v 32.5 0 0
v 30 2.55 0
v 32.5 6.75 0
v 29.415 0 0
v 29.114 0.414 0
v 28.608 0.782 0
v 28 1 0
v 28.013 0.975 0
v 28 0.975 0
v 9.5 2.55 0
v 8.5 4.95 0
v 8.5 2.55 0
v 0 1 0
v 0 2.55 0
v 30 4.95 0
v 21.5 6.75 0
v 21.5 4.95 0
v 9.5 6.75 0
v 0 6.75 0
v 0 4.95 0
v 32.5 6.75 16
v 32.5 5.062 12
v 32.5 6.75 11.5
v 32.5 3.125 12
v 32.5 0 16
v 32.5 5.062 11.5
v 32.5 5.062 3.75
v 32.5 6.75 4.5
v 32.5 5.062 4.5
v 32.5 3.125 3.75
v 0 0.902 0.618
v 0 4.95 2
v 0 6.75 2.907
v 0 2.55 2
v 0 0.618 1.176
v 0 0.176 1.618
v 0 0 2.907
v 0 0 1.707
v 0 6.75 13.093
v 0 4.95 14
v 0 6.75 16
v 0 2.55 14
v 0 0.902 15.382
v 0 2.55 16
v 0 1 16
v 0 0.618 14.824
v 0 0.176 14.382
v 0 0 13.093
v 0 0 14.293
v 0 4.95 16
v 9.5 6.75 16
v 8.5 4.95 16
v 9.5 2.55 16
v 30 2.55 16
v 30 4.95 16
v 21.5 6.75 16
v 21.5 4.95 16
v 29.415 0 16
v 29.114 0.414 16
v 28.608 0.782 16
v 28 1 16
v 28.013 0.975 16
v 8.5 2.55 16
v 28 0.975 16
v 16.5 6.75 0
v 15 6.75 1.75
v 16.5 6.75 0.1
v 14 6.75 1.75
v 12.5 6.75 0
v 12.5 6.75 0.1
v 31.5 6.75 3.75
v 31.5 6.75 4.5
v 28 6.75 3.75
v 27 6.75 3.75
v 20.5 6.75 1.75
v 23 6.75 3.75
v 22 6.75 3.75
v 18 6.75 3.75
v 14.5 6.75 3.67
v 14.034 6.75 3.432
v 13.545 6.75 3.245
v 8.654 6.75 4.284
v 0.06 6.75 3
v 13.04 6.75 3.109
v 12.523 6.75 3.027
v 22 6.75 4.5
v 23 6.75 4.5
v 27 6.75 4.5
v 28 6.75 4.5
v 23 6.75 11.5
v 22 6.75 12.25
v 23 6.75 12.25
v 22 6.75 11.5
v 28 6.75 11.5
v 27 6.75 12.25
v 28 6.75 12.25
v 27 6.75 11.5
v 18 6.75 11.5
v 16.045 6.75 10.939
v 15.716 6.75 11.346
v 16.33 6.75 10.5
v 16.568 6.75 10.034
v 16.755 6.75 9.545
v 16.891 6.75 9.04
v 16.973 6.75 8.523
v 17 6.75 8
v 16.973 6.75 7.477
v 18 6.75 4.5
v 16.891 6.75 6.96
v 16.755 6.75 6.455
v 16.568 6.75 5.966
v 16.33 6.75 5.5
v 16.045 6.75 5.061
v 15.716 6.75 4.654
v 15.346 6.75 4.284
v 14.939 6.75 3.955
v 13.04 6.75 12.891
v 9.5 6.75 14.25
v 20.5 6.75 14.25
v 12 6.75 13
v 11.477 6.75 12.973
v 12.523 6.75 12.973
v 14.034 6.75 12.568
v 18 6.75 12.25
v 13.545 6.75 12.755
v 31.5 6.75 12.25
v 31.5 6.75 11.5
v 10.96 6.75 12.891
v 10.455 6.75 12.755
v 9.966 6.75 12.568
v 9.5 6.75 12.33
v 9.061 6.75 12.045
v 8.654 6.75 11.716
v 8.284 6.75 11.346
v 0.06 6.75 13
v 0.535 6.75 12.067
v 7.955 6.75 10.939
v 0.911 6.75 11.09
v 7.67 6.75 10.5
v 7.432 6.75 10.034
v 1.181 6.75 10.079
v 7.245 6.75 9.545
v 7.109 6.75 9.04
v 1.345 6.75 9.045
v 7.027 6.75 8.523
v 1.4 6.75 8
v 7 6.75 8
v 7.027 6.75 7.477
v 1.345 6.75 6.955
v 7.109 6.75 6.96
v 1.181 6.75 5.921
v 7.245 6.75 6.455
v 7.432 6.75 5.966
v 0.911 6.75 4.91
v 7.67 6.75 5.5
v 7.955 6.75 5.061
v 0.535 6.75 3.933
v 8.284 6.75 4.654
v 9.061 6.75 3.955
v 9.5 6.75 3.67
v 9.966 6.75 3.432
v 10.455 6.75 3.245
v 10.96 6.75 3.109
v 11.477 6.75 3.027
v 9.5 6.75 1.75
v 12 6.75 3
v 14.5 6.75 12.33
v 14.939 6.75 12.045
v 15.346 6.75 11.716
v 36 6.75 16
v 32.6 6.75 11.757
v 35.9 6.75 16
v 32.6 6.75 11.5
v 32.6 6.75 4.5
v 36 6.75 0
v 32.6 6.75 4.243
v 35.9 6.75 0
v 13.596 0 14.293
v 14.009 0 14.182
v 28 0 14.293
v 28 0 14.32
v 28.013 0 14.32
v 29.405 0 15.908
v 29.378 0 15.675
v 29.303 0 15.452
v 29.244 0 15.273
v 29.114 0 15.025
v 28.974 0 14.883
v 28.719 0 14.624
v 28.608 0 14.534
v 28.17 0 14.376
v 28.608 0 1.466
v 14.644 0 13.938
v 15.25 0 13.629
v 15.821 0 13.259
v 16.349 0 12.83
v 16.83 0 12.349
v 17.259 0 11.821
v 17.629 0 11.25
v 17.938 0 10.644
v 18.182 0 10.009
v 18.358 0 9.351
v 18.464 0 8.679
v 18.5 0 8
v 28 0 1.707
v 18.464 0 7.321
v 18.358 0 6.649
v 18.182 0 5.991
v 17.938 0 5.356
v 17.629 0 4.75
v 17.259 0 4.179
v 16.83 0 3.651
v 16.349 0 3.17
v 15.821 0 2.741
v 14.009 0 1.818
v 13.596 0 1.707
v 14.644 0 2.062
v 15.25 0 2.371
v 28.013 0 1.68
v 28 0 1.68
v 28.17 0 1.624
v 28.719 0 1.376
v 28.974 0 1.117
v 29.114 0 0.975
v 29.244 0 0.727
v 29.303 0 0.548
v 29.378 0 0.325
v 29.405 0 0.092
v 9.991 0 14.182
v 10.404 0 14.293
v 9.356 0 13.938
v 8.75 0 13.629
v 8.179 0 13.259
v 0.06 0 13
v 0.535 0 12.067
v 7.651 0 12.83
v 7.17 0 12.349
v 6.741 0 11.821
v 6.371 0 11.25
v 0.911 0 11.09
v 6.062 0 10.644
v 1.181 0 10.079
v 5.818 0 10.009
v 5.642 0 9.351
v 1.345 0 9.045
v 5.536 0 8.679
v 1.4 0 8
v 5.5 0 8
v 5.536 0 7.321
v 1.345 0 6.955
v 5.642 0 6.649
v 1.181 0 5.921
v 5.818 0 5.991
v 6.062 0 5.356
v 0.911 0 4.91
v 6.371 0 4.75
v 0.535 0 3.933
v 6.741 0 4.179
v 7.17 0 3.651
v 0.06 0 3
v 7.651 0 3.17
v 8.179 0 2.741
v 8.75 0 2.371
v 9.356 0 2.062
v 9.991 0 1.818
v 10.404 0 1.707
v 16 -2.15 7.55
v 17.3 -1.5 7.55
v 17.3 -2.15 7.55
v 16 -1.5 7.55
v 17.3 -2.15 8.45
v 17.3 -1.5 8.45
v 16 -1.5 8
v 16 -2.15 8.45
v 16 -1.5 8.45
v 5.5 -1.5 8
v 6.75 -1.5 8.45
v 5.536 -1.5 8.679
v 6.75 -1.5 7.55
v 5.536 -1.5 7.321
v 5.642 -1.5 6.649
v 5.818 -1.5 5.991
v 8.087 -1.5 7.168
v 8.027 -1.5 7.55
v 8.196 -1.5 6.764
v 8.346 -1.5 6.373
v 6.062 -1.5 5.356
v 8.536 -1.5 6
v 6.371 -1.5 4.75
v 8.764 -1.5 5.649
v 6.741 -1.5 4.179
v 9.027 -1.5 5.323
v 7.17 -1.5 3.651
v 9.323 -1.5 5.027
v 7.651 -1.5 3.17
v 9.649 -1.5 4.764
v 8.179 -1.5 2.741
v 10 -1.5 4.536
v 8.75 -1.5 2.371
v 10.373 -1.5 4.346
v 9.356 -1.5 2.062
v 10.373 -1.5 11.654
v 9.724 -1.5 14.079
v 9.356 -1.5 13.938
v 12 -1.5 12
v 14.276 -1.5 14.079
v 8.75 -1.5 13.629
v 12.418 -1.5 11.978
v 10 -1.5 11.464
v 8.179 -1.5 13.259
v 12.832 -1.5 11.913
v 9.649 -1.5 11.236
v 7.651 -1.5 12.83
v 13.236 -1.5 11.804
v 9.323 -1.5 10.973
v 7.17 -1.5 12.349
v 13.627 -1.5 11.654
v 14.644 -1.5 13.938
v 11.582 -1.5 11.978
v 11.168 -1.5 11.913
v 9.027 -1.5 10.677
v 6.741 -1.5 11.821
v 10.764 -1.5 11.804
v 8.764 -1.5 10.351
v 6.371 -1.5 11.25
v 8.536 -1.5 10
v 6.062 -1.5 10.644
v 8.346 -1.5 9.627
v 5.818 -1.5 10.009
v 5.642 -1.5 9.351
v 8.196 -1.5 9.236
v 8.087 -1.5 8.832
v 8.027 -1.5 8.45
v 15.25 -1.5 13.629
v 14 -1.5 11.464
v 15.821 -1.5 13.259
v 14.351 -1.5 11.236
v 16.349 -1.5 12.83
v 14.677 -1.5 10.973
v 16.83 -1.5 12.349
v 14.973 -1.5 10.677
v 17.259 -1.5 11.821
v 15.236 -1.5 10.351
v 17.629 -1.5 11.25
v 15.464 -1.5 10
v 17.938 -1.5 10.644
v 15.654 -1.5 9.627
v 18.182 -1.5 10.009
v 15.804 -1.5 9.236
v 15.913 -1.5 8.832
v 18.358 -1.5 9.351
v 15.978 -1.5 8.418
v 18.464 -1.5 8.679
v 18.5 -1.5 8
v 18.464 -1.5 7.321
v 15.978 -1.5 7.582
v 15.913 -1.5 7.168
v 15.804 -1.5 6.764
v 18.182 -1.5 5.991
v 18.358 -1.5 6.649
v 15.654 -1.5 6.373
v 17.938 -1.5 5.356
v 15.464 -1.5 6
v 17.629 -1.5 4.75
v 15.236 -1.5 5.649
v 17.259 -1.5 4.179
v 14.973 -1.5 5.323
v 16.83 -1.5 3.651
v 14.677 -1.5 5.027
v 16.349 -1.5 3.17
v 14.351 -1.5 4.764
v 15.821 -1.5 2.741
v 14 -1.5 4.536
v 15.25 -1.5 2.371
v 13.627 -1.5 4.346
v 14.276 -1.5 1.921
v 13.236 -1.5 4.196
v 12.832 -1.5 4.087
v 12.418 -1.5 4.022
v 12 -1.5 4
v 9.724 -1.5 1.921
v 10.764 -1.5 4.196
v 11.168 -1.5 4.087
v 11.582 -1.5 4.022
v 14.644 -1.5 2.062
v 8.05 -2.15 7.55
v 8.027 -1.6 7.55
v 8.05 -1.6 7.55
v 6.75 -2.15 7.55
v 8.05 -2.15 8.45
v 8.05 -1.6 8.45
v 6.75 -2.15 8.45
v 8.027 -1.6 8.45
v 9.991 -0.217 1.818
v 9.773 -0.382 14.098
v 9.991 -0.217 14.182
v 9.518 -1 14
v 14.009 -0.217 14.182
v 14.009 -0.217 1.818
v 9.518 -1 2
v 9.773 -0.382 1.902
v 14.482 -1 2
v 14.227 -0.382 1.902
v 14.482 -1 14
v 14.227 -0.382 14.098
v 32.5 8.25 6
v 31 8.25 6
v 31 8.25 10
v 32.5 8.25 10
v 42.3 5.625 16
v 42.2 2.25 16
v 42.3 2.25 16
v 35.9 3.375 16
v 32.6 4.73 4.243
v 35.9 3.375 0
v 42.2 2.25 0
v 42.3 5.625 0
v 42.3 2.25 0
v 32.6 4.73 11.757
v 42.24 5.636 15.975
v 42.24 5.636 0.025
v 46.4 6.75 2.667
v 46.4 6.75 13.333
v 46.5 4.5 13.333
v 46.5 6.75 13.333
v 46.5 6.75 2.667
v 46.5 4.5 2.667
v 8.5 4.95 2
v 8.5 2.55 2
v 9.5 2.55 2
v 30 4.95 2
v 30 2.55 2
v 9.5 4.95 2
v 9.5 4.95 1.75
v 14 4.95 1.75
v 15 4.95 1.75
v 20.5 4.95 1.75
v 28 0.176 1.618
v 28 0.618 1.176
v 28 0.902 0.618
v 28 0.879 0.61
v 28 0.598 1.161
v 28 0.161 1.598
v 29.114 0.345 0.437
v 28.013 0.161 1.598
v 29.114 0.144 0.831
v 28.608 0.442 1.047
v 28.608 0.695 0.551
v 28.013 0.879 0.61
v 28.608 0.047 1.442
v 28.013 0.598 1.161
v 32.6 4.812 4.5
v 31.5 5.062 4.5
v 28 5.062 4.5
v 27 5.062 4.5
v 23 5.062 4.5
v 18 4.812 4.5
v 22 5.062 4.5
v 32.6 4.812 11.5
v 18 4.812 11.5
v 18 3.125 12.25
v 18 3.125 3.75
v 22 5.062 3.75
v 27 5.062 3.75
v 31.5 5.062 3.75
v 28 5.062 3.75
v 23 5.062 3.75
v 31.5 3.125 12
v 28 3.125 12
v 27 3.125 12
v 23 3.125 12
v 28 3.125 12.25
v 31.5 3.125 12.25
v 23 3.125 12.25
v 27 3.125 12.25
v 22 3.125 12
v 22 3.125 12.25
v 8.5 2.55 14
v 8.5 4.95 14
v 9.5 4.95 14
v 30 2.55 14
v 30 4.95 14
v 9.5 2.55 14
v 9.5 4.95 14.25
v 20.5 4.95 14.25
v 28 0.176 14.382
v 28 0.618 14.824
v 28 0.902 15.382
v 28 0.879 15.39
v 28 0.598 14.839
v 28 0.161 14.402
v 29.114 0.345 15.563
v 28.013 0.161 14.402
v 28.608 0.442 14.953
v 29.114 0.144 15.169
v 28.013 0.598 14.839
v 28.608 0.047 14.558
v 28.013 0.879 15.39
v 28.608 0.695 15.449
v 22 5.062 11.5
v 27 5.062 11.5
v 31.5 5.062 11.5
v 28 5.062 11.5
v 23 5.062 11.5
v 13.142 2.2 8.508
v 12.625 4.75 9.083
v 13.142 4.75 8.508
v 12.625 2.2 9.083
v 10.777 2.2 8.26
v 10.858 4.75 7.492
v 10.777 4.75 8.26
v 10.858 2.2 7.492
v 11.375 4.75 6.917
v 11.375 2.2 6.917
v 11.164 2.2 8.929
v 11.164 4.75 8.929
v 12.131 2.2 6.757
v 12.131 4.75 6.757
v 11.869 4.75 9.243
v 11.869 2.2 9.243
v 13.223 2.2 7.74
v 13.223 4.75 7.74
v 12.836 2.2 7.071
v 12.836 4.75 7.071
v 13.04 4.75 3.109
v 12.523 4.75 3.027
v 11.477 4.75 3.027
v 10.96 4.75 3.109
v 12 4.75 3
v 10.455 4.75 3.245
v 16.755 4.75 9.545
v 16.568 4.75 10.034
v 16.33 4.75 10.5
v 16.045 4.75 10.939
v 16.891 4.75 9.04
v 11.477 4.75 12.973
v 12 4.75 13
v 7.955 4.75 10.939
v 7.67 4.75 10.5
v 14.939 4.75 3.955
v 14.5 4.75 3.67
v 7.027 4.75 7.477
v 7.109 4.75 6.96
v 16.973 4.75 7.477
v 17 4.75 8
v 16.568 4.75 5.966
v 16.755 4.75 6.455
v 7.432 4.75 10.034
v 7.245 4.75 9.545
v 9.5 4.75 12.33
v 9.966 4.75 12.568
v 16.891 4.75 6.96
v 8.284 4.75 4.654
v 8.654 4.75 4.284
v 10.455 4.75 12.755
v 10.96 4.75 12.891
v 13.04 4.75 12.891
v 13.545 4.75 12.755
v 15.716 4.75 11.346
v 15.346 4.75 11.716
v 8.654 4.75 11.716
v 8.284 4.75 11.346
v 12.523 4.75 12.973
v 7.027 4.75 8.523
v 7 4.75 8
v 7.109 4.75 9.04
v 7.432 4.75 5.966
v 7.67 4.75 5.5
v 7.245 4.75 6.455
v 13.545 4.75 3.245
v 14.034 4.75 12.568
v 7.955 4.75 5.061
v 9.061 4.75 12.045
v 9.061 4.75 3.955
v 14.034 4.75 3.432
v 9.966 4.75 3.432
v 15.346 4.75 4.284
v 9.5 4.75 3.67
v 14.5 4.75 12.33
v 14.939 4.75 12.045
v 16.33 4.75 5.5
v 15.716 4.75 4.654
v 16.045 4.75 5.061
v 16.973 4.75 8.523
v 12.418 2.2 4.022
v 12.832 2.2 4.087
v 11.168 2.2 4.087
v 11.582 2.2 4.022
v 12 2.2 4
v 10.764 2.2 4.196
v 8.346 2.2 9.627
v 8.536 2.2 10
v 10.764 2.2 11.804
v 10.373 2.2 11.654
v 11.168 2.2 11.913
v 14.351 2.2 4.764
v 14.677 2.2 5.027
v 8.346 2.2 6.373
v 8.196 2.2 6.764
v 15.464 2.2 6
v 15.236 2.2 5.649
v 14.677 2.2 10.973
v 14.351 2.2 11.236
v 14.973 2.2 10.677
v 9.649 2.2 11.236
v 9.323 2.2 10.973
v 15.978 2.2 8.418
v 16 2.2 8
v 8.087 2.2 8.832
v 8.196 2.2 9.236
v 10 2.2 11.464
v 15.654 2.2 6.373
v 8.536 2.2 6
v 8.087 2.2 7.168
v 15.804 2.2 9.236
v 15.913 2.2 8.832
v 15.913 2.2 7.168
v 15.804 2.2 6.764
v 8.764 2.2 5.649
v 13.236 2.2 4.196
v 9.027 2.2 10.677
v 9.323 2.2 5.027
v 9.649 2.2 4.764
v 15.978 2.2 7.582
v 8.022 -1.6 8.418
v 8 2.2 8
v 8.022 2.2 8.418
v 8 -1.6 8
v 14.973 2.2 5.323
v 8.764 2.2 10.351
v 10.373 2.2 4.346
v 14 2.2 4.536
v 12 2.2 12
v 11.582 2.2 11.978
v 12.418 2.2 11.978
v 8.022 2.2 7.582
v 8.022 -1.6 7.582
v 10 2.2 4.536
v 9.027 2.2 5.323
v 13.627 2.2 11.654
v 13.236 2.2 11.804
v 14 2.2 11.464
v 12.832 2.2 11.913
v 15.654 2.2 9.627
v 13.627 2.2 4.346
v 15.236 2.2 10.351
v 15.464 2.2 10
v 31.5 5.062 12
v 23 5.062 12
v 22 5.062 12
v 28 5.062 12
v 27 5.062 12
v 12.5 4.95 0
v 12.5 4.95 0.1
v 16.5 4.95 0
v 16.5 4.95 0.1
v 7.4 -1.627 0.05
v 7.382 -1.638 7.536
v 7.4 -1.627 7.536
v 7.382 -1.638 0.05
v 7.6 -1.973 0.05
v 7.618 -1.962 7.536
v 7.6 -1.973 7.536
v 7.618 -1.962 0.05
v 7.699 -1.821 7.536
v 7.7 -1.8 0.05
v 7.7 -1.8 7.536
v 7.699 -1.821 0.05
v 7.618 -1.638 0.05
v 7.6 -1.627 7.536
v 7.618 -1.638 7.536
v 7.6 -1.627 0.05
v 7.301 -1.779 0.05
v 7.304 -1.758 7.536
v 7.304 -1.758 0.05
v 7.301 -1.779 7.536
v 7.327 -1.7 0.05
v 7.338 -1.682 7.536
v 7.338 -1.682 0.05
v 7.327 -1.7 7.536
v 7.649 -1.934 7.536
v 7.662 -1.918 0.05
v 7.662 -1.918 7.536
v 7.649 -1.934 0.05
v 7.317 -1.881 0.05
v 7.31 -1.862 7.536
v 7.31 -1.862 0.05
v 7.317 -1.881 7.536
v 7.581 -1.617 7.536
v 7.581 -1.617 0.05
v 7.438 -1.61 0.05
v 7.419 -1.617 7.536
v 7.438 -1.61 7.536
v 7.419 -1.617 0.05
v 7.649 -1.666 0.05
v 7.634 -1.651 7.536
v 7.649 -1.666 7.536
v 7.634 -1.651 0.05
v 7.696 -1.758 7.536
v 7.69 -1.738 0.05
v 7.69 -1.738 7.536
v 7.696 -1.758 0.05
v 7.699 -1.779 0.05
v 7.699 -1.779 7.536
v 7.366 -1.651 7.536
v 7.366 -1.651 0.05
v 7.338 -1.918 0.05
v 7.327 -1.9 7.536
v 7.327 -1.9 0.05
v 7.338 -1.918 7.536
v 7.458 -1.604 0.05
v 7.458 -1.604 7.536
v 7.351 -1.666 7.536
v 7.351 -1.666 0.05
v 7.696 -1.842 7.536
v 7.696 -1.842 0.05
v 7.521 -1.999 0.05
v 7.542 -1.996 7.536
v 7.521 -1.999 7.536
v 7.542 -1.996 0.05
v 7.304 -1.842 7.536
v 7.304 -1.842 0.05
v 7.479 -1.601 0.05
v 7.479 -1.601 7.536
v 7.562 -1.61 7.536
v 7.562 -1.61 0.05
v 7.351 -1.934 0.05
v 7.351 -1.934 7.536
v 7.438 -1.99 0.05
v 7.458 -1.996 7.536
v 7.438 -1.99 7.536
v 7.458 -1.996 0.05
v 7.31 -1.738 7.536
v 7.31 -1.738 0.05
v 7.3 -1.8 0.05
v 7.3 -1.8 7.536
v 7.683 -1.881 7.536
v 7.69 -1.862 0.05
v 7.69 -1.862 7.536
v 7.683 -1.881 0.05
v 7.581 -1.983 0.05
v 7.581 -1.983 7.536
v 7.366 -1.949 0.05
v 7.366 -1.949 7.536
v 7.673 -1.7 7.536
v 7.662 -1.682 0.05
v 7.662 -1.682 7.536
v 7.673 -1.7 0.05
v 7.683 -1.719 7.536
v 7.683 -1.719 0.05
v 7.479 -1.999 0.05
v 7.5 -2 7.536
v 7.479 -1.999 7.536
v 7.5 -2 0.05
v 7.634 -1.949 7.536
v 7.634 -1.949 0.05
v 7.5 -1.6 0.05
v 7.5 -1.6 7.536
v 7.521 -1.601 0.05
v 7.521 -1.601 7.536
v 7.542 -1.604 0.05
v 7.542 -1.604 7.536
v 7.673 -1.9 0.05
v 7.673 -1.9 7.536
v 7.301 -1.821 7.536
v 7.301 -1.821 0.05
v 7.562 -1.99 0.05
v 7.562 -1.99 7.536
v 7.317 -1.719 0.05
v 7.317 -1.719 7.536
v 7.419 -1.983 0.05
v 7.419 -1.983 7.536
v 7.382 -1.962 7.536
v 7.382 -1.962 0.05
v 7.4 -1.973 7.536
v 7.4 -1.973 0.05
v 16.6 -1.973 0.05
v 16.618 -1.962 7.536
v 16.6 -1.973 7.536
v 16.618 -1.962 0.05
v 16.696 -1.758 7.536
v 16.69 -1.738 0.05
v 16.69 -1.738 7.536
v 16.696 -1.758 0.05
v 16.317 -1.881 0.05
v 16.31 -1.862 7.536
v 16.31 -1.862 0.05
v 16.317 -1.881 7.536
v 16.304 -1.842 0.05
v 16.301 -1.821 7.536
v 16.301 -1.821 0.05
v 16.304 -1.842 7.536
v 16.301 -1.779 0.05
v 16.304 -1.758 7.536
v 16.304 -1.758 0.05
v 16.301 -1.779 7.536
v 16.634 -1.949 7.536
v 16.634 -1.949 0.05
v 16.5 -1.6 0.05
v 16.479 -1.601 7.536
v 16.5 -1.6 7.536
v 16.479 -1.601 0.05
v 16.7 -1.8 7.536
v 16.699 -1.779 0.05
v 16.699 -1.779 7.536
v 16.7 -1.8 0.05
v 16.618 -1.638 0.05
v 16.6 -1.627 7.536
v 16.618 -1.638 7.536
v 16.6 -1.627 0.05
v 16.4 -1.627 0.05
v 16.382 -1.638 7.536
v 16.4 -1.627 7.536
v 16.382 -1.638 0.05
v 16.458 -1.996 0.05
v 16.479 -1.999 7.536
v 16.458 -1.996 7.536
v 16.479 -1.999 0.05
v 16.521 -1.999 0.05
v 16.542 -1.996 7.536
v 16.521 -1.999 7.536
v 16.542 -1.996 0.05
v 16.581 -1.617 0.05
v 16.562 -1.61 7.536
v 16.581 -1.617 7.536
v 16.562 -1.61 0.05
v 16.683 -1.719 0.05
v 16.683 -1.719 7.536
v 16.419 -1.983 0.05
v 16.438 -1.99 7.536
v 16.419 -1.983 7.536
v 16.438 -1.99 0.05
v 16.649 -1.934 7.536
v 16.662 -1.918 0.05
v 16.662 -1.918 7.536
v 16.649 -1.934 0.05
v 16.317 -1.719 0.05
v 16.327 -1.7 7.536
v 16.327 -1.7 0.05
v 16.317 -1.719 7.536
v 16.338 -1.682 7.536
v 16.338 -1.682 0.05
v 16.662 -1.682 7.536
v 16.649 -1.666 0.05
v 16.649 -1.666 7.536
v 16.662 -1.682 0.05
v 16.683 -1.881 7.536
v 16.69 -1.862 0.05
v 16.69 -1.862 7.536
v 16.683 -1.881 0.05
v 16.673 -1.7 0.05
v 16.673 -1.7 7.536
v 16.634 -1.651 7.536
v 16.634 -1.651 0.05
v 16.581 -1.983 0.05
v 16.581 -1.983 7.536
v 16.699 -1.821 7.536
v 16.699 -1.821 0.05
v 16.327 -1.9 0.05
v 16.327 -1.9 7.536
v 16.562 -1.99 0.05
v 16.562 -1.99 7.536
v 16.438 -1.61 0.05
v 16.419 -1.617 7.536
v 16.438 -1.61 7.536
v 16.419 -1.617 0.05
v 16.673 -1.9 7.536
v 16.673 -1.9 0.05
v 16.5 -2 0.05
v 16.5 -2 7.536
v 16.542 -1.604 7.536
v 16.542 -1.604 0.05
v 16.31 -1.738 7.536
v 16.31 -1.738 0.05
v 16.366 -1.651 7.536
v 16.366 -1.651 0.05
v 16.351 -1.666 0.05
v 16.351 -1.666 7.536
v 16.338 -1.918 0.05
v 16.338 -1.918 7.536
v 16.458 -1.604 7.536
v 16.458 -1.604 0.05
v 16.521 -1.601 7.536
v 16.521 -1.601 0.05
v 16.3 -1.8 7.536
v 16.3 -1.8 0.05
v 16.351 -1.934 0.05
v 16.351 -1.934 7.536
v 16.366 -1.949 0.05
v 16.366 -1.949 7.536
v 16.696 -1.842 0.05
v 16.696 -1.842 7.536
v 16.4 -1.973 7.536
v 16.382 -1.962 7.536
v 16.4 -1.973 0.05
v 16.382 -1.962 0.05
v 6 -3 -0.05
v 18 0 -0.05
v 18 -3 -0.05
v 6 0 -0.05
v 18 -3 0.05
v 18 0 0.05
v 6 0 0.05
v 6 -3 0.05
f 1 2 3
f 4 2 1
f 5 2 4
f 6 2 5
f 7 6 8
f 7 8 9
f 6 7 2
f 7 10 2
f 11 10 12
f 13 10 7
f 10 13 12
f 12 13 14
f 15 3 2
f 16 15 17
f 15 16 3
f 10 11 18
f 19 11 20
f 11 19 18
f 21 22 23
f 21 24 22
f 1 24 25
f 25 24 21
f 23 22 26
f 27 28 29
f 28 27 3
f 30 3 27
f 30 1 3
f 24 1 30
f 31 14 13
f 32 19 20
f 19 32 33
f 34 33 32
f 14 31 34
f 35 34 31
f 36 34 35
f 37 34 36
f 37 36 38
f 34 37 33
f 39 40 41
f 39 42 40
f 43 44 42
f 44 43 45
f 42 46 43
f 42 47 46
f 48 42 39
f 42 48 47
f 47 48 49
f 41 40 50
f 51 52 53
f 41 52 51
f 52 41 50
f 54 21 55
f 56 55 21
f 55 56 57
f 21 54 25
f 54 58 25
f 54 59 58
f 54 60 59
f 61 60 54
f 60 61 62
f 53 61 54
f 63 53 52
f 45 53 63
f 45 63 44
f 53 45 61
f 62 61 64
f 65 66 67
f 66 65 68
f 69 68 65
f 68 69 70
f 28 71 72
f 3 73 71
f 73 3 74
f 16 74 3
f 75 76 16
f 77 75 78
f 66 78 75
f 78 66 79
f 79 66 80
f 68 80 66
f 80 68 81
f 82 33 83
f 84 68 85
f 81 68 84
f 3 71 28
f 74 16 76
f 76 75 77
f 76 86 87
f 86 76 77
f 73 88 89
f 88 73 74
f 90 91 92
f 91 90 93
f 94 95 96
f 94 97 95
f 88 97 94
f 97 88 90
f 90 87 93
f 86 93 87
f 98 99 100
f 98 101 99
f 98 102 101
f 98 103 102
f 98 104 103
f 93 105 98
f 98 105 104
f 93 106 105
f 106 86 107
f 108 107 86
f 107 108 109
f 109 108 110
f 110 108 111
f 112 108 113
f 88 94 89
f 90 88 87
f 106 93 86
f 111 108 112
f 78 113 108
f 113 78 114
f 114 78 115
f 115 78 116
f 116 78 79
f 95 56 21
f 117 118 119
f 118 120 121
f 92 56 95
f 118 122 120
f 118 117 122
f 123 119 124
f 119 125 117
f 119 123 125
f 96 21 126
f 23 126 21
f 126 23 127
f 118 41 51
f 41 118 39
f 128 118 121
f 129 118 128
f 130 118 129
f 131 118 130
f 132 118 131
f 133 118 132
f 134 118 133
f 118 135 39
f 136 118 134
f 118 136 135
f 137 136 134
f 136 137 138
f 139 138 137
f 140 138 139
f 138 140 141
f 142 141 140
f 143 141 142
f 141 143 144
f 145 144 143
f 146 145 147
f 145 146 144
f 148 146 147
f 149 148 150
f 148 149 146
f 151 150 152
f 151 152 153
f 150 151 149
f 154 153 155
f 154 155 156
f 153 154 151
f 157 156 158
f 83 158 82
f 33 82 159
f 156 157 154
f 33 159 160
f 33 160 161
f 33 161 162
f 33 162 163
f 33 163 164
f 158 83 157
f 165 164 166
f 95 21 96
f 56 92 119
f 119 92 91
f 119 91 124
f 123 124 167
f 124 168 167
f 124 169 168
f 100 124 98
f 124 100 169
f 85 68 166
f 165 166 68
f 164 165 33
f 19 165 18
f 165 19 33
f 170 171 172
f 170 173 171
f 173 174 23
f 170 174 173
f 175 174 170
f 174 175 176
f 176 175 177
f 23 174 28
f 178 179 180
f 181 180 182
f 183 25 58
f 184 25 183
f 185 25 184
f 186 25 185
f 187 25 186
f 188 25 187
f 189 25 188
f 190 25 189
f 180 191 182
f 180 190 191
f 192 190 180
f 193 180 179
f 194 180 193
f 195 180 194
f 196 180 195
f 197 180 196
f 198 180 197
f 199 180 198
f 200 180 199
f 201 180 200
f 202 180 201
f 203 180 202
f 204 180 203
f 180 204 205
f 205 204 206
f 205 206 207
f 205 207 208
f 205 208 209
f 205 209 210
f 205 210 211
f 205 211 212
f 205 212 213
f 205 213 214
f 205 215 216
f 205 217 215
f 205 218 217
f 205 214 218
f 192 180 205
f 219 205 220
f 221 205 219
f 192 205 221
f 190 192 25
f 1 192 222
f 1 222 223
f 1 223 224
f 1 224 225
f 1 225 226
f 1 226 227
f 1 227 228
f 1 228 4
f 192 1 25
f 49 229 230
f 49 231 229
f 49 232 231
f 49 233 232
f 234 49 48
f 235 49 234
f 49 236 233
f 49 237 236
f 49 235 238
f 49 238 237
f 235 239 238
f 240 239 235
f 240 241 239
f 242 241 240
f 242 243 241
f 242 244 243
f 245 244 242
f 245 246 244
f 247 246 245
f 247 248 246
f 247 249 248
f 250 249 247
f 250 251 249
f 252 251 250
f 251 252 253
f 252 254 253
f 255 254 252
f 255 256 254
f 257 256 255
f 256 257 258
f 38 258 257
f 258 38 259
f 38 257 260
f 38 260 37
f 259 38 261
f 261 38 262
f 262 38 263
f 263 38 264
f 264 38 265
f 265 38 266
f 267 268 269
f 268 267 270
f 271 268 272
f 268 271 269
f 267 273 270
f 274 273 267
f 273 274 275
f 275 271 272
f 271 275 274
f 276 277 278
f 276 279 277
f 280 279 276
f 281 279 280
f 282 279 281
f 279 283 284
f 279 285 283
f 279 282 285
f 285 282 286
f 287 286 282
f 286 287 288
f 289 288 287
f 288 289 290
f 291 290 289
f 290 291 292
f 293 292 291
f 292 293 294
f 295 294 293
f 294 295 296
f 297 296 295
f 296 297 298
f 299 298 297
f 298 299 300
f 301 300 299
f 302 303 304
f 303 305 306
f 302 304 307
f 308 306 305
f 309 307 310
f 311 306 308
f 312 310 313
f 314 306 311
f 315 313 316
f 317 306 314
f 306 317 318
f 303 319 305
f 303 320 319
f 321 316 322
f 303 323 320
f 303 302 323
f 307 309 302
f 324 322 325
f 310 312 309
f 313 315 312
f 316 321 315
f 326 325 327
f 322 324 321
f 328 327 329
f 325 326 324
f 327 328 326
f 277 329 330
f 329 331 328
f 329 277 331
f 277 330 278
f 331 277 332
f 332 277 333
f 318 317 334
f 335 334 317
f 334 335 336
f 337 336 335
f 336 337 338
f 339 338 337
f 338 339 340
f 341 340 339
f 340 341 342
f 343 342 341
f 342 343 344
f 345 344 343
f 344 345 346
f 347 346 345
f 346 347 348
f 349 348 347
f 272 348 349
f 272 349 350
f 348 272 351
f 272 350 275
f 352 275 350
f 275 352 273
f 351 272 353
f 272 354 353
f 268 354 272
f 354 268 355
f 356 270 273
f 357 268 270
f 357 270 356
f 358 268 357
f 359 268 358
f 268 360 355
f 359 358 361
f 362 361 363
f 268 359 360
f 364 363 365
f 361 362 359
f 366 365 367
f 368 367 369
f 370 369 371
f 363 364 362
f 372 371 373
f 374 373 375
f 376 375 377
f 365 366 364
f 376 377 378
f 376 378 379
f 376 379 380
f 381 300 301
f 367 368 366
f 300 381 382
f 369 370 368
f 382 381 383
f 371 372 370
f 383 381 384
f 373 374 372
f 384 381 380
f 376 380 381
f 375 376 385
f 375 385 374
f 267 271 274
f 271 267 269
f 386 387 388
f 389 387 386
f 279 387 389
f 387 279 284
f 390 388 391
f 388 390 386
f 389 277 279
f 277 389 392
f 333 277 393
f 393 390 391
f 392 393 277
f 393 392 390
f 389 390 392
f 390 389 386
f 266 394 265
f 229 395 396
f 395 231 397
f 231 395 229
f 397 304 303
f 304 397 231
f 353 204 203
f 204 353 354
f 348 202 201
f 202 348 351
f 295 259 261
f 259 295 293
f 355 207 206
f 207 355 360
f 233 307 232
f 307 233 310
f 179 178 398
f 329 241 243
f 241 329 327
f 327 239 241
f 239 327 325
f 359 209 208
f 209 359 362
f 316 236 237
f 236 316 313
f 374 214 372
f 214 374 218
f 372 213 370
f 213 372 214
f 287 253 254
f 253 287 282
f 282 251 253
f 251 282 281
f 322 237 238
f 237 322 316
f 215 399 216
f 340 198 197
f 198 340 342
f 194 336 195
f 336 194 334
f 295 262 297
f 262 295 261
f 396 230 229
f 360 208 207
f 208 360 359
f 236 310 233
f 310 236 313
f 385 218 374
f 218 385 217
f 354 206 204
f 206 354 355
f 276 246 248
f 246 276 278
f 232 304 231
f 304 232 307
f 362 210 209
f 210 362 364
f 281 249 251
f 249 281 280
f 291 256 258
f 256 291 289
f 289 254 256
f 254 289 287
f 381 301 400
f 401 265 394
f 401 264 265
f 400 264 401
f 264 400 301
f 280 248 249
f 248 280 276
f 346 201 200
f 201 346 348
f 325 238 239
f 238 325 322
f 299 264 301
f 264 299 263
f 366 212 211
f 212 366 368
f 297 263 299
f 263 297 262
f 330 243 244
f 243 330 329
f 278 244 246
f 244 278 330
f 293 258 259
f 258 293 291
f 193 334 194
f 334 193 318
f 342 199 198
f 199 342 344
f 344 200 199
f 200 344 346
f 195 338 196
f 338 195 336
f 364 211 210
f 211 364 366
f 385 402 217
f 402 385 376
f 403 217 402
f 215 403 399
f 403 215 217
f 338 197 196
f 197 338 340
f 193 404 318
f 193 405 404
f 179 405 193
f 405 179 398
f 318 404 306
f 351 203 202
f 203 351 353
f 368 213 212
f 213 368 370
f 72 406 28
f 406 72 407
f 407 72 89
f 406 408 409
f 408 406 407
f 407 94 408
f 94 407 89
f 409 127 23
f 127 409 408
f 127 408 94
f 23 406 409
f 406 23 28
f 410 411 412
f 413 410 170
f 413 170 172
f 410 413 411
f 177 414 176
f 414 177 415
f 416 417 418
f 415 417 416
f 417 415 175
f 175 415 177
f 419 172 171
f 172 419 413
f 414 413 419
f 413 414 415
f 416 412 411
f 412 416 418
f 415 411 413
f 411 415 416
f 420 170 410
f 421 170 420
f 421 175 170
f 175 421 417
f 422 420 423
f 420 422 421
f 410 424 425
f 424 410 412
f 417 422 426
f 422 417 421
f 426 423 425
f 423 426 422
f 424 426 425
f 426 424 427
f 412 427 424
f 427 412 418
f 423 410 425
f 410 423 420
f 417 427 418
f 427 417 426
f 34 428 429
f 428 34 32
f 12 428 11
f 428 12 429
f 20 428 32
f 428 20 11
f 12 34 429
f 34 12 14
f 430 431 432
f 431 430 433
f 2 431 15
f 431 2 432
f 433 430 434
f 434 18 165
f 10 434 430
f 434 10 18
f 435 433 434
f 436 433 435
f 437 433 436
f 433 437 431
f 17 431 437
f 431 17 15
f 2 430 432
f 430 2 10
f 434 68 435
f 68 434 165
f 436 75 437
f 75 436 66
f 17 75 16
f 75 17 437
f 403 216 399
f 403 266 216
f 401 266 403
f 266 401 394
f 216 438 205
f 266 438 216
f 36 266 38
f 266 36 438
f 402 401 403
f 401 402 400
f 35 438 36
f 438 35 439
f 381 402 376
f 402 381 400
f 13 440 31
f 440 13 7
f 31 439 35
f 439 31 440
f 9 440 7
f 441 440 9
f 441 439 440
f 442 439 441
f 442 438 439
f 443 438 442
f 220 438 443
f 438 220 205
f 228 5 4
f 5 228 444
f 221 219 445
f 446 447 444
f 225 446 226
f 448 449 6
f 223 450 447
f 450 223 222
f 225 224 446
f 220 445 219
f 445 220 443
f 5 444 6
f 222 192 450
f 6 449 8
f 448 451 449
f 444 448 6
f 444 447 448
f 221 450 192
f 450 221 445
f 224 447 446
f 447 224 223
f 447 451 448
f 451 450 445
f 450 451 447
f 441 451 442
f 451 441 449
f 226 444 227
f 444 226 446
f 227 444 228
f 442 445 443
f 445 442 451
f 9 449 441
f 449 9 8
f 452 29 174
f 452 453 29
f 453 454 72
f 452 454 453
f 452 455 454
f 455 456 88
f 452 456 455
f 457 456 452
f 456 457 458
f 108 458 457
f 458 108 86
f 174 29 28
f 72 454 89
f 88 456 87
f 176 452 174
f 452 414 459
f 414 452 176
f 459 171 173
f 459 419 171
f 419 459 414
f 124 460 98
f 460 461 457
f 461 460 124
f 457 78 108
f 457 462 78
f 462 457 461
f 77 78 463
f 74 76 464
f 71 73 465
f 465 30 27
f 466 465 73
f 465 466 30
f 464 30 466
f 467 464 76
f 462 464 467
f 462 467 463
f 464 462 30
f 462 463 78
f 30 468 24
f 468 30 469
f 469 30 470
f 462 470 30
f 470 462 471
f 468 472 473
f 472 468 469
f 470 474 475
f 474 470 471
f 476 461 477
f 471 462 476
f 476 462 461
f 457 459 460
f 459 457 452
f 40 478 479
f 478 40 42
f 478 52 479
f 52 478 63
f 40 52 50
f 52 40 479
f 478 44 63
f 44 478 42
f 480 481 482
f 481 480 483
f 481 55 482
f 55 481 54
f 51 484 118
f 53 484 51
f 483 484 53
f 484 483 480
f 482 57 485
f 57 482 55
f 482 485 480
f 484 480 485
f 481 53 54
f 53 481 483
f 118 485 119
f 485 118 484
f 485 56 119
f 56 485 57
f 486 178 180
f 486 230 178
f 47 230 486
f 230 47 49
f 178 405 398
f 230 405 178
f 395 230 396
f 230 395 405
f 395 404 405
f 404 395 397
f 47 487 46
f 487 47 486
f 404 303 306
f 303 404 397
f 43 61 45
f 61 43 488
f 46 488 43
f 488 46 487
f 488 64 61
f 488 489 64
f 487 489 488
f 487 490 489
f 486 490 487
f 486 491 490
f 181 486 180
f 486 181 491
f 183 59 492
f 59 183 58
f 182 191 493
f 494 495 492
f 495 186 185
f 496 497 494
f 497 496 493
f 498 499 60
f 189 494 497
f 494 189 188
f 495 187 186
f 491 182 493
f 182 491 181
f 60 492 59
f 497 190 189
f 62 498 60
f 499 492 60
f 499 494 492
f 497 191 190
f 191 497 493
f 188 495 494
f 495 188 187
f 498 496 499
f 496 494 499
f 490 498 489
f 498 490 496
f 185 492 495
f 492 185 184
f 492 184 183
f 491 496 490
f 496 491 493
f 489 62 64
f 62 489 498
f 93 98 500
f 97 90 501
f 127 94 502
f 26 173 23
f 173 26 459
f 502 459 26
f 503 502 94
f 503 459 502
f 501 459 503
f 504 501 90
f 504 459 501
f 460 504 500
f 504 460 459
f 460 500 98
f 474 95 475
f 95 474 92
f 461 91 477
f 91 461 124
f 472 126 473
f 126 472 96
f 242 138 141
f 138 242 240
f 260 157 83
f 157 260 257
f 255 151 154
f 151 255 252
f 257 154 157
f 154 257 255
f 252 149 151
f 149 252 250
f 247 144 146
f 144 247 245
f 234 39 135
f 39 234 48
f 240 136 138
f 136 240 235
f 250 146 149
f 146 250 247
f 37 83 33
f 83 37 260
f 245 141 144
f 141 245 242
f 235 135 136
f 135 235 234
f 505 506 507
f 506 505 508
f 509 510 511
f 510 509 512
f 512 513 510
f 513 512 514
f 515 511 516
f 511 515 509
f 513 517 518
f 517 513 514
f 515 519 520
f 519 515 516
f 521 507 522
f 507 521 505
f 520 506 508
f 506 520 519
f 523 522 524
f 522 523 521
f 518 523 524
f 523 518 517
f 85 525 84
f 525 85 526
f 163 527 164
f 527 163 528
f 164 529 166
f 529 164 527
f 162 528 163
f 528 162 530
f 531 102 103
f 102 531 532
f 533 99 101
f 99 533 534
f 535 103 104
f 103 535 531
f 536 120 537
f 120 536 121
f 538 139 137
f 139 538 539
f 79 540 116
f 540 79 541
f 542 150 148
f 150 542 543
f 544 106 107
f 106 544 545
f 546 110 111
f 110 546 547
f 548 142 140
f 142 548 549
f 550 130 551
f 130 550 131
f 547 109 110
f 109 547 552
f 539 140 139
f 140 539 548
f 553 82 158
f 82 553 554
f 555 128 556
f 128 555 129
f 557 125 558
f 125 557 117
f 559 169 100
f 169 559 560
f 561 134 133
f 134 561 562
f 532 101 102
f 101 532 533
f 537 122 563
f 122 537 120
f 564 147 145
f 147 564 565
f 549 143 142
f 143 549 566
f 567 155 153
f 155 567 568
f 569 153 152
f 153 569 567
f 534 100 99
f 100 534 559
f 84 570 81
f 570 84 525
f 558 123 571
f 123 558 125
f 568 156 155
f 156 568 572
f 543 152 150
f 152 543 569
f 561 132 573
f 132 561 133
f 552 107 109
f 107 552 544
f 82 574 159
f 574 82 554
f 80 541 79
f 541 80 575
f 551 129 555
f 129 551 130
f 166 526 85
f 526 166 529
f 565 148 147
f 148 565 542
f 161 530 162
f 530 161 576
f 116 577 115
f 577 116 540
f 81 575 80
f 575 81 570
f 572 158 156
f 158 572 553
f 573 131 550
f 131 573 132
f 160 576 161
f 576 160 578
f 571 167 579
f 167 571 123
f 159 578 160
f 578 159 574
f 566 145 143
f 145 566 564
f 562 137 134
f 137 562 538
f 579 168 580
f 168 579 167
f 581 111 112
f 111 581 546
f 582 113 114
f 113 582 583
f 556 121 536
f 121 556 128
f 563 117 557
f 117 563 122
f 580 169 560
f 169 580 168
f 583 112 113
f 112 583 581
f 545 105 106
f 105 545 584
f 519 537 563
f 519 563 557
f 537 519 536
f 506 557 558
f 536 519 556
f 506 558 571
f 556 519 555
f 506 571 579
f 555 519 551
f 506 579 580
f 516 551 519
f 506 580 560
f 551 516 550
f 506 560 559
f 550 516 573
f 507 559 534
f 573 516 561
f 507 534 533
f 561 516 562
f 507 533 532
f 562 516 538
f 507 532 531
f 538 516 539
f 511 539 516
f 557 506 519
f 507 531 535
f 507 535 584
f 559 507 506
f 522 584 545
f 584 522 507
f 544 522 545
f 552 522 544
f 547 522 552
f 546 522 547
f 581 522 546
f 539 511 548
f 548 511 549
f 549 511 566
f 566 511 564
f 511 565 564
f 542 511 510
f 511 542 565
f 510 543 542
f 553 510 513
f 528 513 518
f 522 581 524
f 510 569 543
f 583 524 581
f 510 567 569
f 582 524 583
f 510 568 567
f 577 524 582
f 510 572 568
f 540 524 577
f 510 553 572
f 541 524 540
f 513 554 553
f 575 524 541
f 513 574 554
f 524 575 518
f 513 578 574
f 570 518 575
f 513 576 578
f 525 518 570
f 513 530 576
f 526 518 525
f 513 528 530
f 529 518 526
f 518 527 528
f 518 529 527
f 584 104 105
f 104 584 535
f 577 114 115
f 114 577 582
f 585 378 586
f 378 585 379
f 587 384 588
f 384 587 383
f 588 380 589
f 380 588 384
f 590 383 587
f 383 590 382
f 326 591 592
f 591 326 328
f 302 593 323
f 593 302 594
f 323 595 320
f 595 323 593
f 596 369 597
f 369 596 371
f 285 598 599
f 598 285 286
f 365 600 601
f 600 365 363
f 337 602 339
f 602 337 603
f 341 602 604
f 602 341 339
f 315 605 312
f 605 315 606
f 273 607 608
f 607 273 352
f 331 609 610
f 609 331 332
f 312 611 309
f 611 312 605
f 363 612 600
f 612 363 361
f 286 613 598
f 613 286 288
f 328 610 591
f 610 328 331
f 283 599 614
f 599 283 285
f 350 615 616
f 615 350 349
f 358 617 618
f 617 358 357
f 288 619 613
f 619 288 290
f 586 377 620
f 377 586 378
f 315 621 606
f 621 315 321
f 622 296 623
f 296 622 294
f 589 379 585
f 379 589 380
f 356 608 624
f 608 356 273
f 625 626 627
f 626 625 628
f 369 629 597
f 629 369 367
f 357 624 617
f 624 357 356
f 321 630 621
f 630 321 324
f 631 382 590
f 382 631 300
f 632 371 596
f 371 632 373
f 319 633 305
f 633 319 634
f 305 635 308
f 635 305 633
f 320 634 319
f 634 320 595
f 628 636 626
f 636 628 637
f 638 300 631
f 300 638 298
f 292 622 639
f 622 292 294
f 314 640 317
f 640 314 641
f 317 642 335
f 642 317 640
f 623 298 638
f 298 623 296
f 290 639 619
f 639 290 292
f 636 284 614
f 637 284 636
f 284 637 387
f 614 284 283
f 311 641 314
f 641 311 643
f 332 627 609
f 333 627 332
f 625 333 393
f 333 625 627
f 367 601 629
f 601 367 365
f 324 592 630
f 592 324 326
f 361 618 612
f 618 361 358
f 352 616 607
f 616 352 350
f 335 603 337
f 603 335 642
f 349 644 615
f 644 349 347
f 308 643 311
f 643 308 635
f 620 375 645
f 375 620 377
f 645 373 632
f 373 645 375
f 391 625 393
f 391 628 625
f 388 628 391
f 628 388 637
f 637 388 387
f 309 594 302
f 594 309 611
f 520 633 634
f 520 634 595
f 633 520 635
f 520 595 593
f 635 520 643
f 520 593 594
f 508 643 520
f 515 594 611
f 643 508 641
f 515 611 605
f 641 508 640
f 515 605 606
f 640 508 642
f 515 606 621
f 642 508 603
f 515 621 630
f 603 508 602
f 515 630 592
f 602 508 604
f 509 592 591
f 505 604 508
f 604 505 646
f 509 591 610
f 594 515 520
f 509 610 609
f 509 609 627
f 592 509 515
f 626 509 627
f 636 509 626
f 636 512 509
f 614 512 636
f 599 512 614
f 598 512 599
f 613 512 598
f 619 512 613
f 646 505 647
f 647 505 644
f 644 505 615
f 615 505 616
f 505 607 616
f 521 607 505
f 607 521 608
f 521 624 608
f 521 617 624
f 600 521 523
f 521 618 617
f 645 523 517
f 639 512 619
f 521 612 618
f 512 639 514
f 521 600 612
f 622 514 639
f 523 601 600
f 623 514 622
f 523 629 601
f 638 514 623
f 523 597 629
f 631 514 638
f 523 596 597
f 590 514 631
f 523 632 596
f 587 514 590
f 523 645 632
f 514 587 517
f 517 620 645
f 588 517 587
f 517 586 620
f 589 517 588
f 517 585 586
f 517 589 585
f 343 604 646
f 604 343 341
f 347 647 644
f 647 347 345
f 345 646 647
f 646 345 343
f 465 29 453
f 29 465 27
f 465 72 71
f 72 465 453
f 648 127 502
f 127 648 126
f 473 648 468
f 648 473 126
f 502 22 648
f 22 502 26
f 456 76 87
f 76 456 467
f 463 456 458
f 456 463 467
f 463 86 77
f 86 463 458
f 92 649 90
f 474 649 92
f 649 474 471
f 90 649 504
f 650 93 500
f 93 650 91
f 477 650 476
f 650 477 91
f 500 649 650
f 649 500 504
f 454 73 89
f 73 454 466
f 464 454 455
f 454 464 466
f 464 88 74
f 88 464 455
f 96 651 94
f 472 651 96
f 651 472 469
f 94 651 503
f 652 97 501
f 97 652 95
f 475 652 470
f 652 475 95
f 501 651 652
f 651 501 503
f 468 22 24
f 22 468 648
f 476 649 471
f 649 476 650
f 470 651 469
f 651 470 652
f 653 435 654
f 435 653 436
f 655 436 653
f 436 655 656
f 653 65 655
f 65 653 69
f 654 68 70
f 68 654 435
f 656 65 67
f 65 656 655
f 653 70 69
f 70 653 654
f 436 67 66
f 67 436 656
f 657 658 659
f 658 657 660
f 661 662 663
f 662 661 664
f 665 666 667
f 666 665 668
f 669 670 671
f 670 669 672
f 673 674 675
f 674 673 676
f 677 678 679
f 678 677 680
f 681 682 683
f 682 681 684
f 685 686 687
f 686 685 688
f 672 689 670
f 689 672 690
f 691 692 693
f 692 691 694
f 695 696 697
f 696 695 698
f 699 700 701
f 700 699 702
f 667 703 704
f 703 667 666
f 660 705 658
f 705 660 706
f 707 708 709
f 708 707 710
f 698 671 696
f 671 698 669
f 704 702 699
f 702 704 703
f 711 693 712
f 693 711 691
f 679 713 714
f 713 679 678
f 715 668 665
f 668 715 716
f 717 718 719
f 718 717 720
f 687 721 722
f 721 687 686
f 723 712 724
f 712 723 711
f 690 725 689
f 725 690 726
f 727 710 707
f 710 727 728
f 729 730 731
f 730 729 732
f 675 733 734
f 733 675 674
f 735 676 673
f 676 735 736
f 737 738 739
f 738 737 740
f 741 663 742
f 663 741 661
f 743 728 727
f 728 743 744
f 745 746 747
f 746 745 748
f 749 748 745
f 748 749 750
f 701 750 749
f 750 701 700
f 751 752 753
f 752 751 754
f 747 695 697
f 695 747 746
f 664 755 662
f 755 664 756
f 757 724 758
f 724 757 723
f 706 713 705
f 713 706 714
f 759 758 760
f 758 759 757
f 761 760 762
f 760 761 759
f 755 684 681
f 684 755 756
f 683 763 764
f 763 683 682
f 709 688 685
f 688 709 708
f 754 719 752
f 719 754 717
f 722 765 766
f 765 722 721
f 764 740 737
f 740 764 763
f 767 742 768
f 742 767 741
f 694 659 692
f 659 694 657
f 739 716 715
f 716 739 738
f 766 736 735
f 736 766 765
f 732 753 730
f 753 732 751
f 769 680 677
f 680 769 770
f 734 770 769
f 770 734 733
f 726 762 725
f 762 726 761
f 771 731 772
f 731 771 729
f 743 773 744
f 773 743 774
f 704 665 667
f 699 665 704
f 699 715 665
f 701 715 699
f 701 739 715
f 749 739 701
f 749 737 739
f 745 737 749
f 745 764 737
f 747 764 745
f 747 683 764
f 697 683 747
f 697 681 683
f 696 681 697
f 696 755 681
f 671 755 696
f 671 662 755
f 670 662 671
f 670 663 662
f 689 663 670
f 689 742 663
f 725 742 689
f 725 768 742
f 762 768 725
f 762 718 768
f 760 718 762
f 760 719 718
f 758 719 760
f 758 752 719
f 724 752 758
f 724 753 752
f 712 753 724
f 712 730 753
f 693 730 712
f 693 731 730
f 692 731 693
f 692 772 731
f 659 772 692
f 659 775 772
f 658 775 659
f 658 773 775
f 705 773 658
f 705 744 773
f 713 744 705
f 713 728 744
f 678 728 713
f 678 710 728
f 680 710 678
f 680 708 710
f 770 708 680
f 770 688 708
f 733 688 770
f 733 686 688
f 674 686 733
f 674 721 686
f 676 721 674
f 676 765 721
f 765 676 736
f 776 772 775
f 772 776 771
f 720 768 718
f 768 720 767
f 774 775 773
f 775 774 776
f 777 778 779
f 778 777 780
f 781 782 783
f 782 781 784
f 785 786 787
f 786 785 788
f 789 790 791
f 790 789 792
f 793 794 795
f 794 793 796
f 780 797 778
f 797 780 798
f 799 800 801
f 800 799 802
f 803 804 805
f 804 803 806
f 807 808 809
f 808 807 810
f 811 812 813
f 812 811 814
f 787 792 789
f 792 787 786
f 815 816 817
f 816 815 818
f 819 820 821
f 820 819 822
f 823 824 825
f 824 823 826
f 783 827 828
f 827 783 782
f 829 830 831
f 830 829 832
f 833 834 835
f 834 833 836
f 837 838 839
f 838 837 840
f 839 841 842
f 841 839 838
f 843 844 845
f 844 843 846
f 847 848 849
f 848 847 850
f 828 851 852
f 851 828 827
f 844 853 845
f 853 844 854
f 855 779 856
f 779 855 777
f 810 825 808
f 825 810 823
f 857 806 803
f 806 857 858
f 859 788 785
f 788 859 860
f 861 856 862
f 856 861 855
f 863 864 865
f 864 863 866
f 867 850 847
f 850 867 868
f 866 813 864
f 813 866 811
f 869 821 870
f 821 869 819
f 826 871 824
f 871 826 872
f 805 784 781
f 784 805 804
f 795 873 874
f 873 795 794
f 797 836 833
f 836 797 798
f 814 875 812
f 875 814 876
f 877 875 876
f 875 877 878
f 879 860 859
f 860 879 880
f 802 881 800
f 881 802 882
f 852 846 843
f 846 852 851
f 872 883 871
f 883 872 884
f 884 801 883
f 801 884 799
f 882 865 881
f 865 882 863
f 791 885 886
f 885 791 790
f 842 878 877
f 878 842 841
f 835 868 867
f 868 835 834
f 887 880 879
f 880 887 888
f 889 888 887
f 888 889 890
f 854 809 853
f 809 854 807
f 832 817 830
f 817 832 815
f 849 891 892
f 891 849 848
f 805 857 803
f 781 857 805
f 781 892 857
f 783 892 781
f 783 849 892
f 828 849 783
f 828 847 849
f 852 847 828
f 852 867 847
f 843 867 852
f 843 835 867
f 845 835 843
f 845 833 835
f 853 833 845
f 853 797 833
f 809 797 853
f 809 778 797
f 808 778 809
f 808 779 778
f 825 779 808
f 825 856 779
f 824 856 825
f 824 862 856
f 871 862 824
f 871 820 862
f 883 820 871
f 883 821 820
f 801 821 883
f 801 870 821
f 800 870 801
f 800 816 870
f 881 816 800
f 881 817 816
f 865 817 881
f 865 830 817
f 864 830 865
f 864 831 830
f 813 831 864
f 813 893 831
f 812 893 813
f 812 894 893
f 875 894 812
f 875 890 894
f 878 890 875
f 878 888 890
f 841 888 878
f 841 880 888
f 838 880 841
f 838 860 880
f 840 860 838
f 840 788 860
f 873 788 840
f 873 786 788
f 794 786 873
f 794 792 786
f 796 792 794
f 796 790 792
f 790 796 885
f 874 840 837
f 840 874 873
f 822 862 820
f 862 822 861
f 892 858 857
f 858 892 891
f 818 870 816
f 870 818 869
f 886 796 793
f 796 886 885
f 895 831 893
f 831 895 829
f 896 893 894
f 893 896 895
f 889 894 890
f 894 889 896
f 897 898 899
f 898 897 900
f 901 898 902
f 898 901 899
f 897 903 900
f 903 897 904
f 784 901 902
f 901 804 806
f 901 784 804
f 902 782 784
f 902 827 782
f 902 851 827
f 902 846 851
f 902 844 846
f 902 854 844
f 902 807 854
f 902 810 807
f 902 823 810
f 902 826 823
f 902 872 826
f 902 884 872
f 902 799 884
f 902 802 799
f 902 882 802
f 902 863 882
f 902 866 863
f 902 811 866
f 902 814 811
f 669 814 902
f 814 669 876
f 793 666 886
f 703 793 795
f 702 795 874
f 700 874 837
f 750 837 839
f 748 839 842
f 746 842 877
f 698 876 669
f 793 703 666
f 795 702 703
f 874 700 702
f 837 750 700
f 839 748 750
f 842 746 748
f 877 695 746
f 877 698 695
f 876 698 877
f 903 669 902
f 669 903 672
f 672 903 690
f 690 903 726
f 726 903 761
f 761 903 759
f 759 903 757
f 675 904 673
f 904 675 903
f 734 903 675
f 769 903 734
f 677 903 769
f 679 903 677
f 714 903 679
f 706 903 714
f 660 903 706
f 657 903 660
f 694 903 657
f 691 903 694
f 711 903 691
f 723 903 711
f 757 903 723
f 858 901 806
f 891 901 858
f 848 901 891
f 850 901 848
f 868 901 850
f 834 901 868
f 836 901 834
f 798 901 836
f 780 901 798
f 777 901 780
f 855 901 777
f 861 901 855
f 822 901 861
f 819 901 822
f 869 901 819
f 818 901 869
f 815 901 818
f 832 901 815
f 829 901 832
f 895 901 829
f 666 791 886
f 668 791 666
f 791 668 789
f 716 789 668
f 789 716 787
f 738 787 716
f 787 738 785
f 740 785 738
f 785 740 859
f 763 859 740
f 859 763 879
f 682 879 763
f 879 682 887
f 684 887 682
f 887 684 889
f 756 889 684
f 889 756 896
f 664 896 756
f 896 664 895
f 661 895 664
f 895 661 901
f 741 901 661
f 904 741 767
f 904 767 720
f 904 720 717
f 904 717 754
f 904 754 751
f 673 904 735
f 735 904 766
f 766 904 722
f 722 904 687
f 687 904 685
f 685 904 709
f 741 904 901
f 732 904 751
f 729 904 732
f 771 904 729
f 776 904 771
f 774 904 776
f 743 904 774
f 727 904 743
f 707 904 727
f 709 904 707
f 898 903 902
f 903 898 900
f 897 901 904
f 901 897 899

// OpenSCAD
//////////////////////////////////////////////////////////////////////////////////////
///
///  eTrex1Adapter - Screw-on adapter for Garmin eTrex Vista/Legend/... C/Cx/HCx
///                  GPS device to allow use with bike and car mounts
///
///                  The original adapter is included when buying the GPS device,
///                  but in case you lost it or you broke it, it's nice to be
///                  able to print a new one...
///
///                  Needs a 10mm long screw with UNC #4-40 thread to fit thread
///                  on eTrex battry cover.
///        
//////////////////////////////////////////////////////////////////////////////////////
///
///  2013-10-17 Heinz Spiess, Switzerland
///
///  released under Creative Commons - Attribution - Share Alike licence
//////////////////////////////////////////////////////////////////////////////////////

$fn = 60;

module etrex1adapter(supports=false,eps=0.5){

   bh = 32.5;  // main body height
   bw = 16;  // main body width
   bd = 6.75;   // main body depth
   rw = 1.75; // width of rail groove
   rd = 2.4;  // depth of rail groove
   ro = 1.8;    // offset of rail groove
   rh1 = 8.5; // height of first rail bridge
   rh2 = 20.5;  // height of rail hangover
   rh3 = 30;  // height of second rail bridge
   kr = 2;    // radius of left and right cutouts 
   sh = 12; // height of screw center
   //eps = 0.5; // separation of tongue
   tw = 7;    // tongue width
   th = 14;   // tongue height
    
    

    difference(){
        union(){
           //main body
           translate([-bw/2,0,0])cube([bw,bd,bh]);
           
           // Nub
           translate([0 - 0.45,-1.5 - 0.65, sh + 6.5 - 2.5]){
               cube([0.9, 0.65, 1.30]);
           }
           
           // Nub
           translate([0 - 0.45,-1.5 - 0.65, sh - 6.5 + 2.5 - 1.25]){
               cube([0.9, 0.65, 1.30]);
           }
            
           // screw reinforcing
           translate([0,-1.5,sh])rotate(-90,[1,0,0])cylinder(r2=6.5,r1=6.5,h=1.6);
           // clip part of tongue
           hull(){
              translate([-tw/2,bd-1,bh-4.5])cube([tw,1,4.5]);
              translate([-tw/2+1.5,bd-1.5,bh-1.5])cube([tw-3,3,1.5]);
           }
           // lower part of tongue finger rest
           hull(){
              translate([-tw/2,0.75*bd-0.25,bh-0.1])cube([tw,bd/4+0.25,0.1]);
              translate([-bw/2,2*bd/4,bh+th/4-0.1])cube([bw,bd/2,0.1]);
           }
           // middle part of tongue finger rest
           hull(){
              translate([-bw/2,2*bd/4,bh+th/4-0.1])cube([bw,bd/2,0.1]);
              translate([-bw/2,bd/3,bh+0.7*th-0.1])cube([bw,bd/2,0.1]);
           }
           // upper part of tongue finger rest
           hull(){
              translate([-bw/2,bd/3,bh+0.7*th-0.1])cube([bw,bd/2,0.1]);
              translate([-bw/3,2*bd/3,bh+th-0.1])cube([2*bw/3,bd/3,0.1]);
           }
        }
        // show radius of battery opening lever
        //%translate([0,-2,-4])rotate(-90,[1,0,0])cylinder(r=5,h=bd+2);
        // cavity to allow opening of battery case while adapter is mounted
        //hull(){
          // translate([-tw/2,-1,-1])cube([tw,bd+2,1]);
           //translate([-tw/2+1.5,-1,-1])cube([tw-3,bd+2,3]);
        
        rotate([0, 90, 90]) {
            translate([10-1.4, 0, -0.1]) {
                cylinder(r1=10,r2=10,h=bd * 1.2);
            }
        };

        //}
        for(s = [-1,1])scale([s,1,1]){
            // left and right slide rails
            translate([-bw/2-1,bd-rd-ro,-1])cube([1+rw+0.25,rd,1+rh1]);
        translate([-bw/2-1,bd-rd-ro,rh1+1])cube([1+rw+0.25,rd,rh3-rh1-1]);
        hull(){
           translate([-bw/2-0.1,bd-rd-ro,rh1+1])cube([0.1,bd,rh2-rh1]);
           translate([-bw/2+rw-0.1,bd-rd-ro,rh1+1])cube([0.1,bd,rh2-rh1-1]);
        }
        // left and right grooves to fit bumps on GPS battery cover
        translate([-bw/2,-1,-1])cylinder(r=kr,rh3-1,$fn=20);
        translate([-bw/2,-1,rh3-0.3-kr])sphere(r=kr,$fn=20);
        // tongue cutouts
        translate([-tw/2-eps,bd/2-0.25,18])cube([eps,bd/2+0.5,bh-18+0.1]);
        translate([-tw/2-eps,bd/2-0.25,18])cube([tw/2+eps+0.1,bd/4,bh-18+0.1]);
        }
        // screw hole
        translate([0,-5,sh])rotate(-90,[1,0,0])rotate(supports?30:0)cylinder(r=1.25,h=bd+6,$fn=10);
        // cavity for screw head
        translate([0,4.75,sh])rotate(-90,[1,0,0])cylinder(r1=5,r2=5,h=.3*bd+0.1);
        // cavity for screw nut cylinder on battery cover
        
        translate([0,-1.6,sh])rotate(-90,[1,0,0])cylinder(r1=4,r2=4,h=3.8);
    }
    color("red")if(supports){
       for(z = [bh-1,22,27]){
          for(s = [-1,1])scale([s,1,1]) translate([-tw/2-eps,3*bd/4,z])cube([eps,bd/4,1]);
          translate([-tw/2-eps,bd/2-0.5,z])cube([eps/3,bd/2,1]);
       }
       hull(){
         translate([bw/2-0.1,bd-ro,(rh1+rh2)/2-2])cube([0.1,ro,4]);
         translate([bw/2-rw,bd-ro,(rh1+rh2)/2-0.5])cube([rw,ro,1]);
       }
       
        rotate(-90,[0,1,0]) {
            translate([sh - 4.5, -1.8, -8]){
                cylinder(h=sh * 0.628, r1=0.2, r2=0.2);
            }
         
        }
           
        rotate(-90,[0,1,0]) {
            translate([sh + 4.5, -1.8, -8]){
                cylinder(h=sh * 0.628, r1=0.2, r2=0.2);
            }
         
        }
        
        translate([bw * 0.5 - 0.05, -3, 6]){
            cube([0.1, 3, 12]);
        }
        
    }
}

// ...on the following lines you have to activate the desired object by uncommenting...

// uncomment the following for vertical printing
// (prints well but needs good printing quality for the tongue to be strong enough)
//etrex1adapter();

// for horizontal printing, uses explicit supports (red!) that need to be cut after printing
// (print is stronger, as the layers are parallel to the flexible tonguei
// and has less friction sind layers are parallel to sliding direction)
//translate([15,0,8])rotate(90,[0,1,0])etrex1adapter(supports=true,eps=0.75);
translate([0,0,8])rotate(90,[0,1,0])etrex1adapter(supports=true,eps=0.75);
